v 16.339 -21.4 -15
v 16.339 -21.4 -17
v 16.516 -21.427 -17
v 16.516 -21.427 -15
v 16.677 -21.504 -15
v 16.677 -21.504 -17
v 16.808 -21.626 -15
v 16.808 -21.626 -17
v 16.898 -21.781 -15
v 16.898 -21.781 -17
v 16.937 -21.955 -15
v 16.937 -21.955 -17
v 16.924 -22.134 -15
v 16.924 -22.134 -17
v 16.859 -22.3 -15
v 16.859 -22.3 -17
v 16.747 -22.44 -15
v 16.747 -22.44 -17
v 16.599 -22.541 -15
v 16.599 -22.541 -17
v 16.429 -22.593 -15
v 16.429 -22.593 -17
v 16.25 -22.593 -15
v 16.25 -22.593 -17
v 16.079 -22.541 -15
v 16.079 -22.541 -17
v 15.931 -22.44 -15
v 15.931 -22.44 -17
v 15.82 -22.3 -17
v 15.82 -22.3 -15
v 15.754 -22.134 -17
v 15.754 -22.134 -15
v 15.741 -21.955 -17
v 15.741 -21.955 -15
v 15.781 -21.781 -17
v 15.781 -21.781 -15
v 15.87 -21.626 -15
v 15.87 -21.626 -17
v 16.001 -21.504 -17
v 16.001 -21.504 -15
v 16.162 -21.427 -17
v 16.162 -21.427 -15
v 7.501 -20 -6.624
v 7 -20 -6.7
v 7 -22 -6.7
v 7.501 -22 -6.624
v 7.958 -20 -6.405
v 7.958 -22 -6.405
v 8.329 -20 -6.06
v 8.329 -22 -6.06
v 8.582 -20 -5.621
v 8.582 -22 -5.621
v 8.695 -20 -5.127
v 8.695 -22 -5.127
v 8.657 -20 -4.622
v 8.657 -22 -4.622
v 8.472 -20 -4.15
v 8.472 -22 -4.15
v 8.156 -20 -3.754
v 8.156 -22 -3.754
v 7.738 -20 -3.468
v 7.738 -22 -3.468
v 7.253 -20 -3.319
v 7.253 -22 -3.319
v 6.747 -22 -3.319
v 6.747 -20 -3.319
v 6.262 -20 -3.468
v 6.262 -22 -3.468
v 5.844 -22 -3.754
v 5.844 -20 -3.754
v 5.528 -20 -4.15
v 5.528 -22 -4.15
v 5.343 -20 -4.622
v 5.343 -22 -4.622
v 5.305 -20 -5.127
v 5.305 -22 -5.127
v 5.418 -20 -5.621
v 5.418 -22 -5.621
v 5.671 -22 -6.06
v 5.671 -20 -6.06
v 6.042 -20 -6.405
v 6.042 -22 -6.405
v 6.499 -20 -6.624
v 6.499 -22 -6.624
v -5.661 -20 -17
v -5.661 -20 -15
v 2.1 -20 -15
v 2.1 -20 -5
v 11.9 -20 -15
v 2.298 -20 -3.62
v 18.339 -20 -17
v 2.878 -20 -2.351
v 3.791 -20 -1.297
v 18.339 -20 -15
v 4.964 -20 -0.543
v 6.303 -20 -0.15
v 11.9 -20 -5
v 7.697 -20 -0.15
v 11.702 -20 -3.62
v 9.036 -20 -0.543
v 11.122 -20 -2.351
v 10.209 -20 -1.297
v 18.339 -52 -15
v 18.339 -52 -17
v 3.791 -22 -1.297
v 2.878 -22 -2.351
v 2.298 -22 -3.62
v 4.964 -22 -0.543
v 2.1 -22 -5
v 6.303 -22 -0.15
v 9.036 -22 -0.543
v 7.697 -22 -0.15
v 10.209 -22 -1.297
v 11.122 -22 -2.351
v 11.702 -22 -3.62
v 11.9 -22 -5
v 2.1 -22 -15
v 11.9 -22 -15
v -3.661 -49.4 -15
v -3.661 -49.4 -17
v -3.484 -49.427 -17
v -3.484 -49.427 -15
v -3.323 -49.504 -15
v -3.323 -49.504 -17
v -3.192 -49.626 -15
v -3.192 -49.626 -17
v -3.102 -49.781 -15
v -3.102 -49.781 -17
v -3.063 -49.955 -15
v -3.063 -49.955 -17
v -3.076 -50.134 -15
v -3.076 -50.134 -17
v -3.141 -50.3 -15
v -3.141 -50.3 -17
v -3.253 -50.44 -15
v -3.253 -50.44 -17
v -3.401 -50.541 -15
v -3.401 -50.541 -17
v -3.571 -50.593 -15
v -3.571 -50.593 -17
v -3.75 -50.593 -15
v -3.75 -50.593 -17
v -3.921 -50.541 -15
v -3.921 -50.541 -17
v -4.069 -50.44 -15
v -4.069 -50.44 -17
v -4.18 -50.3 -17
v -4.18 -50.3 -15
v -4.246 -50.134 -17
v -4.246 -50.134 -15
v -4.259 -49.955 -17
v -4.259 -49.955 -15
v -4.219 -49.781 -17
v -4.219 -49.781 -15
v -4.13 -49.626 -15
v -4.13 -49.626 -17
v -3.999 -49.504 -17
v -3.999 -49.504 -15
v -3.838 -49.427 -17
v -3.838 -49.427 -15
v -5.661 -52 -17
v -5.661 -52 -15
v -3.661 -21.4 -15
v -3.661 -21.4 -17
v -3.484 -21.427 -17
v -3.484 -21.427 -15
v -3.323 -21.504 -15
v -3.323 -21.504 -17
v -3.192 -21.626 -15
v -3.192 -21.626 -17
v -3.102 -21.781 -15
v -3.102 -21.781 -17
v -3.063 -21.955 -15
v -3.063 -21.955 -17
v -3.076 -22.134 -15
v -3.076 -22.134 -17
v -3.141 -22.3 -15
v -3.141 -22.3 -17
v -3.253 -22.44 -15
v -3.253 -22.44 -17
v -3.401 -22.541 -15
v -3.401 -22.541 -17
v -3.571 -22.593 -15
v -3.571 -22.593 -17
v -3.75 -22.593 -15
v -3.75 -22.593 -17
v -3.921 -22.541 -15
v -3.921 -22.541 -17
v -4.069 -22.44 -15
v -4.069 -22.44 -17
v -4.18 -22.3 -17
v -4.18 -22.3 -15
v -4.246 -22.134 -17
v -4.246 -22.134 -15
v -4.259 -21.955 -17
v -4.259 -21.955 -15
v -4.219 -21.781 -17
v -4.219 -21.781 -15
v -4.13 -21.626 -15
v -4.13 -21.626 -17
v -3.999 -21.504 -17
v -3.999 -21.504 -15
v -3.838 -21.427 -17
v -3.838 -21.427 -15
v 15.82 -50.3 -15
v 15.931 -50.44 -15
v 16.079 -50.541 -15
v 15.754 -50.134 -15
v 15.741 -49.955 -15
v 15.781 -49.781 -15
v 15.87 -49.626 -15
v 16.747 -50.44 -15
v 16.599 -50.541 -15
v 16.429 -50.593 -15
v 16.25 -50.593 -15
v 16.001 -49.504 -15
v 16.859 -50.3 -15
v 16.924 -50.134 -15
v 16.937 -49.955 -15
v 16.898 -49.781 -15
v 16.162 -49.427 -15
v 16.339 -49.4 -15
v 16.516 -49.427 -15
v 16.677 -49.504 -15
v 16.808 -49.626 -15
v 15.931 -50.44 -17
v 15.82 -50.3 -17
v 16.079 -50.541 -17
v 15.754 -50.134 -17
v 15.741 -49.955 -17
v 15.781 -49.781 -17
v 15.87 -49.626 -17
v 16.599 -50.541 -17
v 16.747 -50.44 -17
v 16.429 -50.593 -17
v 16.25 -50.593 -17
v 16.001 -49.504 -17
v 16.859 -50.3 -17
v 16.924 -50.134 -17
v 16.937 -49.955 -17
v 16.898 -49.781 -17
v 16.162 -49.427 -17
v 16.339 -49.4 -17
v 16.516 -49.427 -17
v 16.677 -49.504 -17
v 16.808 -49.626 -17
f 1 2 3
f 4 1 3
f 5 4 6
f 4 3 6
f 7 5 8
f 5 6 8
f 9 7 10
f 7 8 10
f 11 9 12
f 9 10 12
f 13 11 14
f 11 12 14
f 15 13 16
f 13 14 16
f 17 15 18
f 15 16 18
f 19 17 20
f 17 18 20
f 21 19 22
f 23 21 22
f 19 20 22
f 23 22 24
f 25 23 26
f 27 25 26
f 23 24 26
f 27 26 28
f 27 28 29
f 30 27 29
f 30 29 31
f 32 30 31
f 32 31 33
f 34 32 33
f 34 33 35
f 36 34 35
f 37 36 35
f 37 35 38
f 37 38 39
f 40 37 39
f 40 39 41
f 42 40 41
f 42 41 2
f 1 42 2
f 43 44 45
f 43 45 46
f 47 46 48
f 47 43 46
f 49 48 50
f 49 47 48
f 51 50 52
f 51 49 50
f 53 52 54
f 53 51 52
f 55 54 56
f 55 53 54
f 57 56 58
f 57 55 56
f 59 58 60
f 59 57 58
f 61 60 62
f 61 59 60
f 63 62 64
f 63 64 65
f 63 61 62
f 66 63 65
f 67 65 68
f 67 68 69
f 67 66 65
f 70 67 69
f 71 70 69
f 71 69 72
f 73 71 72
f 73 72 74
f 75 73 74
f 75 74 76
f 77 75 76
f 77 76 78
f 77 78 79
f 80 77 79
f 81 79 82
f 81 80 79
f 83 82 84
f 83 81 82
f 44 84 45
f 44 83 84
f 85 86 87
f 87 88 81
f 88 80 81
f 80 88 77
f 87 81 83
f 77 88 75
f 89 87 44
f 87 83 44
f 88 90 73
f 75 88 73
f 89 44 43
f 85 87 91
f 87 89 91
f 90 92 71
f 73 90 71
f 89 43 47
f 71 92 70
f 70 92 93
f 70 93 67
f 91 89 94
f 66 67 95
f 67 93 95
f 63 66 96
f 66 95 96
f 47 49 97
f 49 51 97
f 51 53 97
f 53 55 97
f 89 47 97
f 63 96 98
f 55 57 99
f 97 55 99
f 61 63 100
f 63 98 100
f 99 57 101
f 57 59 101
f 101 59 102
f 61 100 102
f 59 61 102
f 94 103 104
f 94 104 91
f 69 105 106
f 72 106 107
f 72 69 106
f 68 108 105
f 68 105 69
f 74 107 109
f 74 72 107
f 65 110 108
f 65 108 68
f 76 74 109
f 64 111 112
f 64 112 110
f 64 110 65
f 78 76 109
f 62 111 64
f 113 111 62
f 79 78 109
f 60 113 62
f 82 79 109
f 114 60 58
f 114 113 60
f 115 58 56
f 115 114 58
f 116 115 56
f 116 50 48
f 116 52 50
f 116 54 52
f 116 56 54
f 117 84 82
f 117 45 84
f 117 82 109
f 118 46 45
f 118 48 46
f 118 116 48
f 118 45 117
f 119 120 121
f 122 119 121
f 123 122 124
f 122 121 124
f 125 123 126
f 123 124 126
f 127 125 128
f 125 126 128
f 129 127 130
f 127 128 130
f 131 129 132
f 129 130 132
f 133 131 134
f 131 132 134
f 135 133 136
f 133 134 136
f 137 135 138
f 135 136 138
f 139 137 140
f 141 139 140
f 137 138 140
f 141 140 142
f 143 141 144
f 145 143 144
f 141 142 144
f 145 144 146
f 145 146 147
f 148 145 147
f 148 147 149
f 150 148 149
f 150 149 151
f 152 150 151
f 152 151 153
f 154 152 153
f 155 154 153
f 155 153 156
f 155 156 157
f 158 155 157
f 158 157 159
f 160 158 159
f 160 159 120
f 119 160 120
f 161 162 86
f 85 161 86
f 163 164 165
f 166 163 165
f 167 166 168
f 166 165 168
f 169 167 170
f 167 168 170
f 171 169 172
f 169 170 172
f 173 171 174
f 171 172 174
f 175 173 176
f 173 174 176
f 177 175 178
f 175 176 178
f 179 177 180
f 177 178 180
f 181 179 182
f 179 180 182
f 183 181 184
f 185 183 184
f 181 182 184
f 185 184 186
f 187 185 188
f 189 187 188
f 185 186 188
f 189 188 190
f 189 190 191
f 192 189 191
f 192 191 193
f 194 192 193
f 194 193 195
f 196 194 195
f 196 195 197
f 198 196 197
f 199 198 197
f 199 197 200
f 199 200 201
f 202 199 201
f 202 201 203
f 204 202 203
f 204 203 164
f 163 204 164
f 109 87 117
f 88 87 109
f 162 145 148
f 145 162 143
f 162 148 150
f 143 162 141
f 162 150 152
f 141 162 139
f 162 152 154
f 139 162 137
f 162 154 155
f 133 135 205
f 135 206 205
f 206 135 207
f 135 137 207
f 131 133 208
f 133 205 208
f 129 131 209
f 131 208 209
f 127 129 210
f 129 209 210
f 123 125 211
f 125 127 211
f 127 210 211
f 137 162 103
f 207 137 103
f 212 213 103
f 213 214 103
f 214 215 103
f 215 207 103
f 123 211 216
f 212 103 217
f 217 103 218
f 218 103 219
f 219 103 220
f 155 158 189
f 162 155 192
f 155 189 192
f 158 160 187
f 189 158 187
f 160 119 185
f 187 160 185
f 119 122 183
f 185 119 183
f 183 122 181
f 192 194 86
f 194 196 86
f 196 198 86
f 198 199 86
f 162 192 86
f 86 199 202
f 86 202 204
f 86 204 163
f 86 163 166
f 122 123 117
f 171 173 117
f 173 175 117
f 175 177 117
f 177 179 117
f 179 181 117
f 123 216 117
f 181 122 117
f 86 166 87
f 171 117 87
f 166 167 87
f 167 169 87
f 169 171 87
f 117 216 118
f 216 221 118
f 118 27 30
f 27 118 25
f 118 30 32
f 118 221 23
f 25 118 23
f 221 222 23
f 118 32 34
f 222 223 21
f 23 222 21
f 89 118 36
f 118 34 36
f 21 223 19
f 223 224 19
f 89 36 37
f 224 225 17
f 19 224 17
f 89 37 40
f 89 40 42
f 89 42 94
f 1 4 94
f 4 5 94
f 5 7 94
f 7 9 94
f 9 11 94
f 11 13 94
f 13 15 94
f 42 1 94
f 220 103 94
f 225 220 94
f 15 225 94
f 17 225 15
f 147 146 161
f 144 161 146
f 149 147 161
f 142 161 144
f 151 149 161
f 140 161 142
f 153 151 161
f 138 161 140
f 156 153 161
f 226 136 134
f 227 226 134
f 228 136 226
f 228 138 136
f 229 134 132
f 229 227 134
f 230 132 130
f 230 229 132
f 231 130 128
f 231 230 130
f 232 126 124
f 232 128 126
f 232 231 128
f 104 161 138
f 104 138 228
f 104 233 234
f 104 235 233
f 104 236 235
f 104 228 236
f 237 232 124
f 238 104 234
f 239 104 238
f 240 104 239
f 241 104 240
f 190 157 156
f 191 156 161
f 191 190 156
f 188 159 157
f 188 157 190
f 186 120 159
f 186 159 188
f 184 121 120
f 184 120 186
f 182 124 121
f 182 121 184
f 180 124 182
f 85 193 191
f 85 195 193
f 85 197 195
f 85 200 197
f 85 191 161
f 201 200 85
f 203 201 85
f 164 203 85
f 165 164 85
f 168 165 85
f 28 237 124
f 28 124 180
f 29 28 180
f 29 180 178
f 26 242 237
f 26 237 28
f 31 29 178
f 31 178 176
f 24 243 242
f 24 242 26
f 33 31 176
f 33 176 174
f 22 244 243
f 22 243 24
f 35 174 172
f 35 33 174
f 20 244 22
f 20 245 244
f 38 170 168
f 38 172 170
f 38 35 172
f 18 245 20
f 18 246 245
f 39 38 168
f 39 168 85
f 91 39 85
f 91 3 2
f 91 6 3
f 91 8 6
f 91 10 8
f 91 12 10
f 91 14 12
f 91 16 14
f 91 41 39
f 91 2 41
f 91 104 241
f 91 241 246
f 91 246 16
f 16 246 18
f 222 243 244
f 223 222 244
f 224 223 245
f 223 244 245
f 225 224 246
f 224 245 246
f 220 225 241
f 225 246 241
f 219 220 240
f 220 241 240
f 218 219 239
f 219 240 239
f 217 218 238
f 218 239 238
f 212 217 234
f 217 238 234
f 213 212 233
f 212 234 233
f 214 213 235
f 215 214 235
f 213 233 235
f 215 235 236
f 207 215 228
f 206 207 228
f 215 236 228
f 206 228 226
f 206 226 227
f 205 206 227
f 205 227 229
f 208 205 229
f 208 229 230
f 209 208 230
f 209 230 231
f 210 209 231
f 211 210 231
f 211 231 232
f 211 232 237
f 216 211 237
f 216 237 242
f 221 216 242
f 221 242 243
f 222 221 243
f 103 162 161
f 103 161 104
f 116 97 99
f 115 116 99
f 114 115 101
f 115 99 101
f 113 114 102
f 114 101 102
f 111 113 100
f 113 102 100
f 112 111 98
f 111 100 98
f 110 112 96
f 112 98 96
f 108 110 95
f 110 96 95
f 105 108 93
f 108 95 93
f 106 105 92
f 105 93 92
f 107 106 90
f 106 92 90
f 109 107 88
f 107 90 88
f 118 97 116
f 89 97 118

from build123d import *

# Parameters (mm, degrees)
SKETCH007_R   = 1.7
PAD004_DEPTH  = 2
SKETCH009_W   = 32
SKETCH009_H   = 24
PAD005_DEPTH  = 2
SKETCH010_R   = 0.6
HOLE001_DEPTH = 25


with BuildPart() as part:
    # Sketch007 (on Face8 of ShapeBinder001) → Pad004 (new body)
    with BuildSketch(Plane(origin=(2, -20, 0), x_dir=(0, 0, -1), z_dir=(0, -1, 0))):
        with BuildLine():
            ThreePointArc((5, 9.9), (0.1, 5), (5, 0.1))
            Line((15, 0.1), (5, 0.1))
            Line((15, 9.9), (15, 0.1))
            Line((5, 9.9), (15, 9.9))
        make_face()
        with Locations((5, 5)):
            Circle(SKETCH007_R, mode=Mode.SUBTRACT)
    extrude(amount=PAD004_DEPTH)

    # Sketch009 (on Face4 of Pad004) → Pad005 (join)
    with BuildSketch(Plane(origin=(2, 0, -15), x_dir=(0, 1, 0), z_dir=(0, 0, -1))):
        with Locations((-36, 4.339121)):
            Rectangle(SKETCH009_W, SKETCH009_H)
    extrude(amount=PAD005_DEPTH)

    # Sketch010 (on Face10 of Pad005) → Hole001 (cut)
    with BuildSketch(Plane(origin=(2, 0, -17), x_dir=(0, 1, 0), z_dir=(0, 0, -1))):
        with Locations((-50, 14.339121)):
            Circle(SKETCH010_R)
        with Locations((-22, 14.339121)):
            Circle(SKETCH010_R)
        with Locations((-22, -5.660879)):
            Circle(SKETCH010_R)
        with Locations((-50, -5.660879)):
            Circle(SKETCH010_R)
    extrude(amount=-HOLE001_DEPTH, mode=Mode.SUBTRACT)


solid = part.part
